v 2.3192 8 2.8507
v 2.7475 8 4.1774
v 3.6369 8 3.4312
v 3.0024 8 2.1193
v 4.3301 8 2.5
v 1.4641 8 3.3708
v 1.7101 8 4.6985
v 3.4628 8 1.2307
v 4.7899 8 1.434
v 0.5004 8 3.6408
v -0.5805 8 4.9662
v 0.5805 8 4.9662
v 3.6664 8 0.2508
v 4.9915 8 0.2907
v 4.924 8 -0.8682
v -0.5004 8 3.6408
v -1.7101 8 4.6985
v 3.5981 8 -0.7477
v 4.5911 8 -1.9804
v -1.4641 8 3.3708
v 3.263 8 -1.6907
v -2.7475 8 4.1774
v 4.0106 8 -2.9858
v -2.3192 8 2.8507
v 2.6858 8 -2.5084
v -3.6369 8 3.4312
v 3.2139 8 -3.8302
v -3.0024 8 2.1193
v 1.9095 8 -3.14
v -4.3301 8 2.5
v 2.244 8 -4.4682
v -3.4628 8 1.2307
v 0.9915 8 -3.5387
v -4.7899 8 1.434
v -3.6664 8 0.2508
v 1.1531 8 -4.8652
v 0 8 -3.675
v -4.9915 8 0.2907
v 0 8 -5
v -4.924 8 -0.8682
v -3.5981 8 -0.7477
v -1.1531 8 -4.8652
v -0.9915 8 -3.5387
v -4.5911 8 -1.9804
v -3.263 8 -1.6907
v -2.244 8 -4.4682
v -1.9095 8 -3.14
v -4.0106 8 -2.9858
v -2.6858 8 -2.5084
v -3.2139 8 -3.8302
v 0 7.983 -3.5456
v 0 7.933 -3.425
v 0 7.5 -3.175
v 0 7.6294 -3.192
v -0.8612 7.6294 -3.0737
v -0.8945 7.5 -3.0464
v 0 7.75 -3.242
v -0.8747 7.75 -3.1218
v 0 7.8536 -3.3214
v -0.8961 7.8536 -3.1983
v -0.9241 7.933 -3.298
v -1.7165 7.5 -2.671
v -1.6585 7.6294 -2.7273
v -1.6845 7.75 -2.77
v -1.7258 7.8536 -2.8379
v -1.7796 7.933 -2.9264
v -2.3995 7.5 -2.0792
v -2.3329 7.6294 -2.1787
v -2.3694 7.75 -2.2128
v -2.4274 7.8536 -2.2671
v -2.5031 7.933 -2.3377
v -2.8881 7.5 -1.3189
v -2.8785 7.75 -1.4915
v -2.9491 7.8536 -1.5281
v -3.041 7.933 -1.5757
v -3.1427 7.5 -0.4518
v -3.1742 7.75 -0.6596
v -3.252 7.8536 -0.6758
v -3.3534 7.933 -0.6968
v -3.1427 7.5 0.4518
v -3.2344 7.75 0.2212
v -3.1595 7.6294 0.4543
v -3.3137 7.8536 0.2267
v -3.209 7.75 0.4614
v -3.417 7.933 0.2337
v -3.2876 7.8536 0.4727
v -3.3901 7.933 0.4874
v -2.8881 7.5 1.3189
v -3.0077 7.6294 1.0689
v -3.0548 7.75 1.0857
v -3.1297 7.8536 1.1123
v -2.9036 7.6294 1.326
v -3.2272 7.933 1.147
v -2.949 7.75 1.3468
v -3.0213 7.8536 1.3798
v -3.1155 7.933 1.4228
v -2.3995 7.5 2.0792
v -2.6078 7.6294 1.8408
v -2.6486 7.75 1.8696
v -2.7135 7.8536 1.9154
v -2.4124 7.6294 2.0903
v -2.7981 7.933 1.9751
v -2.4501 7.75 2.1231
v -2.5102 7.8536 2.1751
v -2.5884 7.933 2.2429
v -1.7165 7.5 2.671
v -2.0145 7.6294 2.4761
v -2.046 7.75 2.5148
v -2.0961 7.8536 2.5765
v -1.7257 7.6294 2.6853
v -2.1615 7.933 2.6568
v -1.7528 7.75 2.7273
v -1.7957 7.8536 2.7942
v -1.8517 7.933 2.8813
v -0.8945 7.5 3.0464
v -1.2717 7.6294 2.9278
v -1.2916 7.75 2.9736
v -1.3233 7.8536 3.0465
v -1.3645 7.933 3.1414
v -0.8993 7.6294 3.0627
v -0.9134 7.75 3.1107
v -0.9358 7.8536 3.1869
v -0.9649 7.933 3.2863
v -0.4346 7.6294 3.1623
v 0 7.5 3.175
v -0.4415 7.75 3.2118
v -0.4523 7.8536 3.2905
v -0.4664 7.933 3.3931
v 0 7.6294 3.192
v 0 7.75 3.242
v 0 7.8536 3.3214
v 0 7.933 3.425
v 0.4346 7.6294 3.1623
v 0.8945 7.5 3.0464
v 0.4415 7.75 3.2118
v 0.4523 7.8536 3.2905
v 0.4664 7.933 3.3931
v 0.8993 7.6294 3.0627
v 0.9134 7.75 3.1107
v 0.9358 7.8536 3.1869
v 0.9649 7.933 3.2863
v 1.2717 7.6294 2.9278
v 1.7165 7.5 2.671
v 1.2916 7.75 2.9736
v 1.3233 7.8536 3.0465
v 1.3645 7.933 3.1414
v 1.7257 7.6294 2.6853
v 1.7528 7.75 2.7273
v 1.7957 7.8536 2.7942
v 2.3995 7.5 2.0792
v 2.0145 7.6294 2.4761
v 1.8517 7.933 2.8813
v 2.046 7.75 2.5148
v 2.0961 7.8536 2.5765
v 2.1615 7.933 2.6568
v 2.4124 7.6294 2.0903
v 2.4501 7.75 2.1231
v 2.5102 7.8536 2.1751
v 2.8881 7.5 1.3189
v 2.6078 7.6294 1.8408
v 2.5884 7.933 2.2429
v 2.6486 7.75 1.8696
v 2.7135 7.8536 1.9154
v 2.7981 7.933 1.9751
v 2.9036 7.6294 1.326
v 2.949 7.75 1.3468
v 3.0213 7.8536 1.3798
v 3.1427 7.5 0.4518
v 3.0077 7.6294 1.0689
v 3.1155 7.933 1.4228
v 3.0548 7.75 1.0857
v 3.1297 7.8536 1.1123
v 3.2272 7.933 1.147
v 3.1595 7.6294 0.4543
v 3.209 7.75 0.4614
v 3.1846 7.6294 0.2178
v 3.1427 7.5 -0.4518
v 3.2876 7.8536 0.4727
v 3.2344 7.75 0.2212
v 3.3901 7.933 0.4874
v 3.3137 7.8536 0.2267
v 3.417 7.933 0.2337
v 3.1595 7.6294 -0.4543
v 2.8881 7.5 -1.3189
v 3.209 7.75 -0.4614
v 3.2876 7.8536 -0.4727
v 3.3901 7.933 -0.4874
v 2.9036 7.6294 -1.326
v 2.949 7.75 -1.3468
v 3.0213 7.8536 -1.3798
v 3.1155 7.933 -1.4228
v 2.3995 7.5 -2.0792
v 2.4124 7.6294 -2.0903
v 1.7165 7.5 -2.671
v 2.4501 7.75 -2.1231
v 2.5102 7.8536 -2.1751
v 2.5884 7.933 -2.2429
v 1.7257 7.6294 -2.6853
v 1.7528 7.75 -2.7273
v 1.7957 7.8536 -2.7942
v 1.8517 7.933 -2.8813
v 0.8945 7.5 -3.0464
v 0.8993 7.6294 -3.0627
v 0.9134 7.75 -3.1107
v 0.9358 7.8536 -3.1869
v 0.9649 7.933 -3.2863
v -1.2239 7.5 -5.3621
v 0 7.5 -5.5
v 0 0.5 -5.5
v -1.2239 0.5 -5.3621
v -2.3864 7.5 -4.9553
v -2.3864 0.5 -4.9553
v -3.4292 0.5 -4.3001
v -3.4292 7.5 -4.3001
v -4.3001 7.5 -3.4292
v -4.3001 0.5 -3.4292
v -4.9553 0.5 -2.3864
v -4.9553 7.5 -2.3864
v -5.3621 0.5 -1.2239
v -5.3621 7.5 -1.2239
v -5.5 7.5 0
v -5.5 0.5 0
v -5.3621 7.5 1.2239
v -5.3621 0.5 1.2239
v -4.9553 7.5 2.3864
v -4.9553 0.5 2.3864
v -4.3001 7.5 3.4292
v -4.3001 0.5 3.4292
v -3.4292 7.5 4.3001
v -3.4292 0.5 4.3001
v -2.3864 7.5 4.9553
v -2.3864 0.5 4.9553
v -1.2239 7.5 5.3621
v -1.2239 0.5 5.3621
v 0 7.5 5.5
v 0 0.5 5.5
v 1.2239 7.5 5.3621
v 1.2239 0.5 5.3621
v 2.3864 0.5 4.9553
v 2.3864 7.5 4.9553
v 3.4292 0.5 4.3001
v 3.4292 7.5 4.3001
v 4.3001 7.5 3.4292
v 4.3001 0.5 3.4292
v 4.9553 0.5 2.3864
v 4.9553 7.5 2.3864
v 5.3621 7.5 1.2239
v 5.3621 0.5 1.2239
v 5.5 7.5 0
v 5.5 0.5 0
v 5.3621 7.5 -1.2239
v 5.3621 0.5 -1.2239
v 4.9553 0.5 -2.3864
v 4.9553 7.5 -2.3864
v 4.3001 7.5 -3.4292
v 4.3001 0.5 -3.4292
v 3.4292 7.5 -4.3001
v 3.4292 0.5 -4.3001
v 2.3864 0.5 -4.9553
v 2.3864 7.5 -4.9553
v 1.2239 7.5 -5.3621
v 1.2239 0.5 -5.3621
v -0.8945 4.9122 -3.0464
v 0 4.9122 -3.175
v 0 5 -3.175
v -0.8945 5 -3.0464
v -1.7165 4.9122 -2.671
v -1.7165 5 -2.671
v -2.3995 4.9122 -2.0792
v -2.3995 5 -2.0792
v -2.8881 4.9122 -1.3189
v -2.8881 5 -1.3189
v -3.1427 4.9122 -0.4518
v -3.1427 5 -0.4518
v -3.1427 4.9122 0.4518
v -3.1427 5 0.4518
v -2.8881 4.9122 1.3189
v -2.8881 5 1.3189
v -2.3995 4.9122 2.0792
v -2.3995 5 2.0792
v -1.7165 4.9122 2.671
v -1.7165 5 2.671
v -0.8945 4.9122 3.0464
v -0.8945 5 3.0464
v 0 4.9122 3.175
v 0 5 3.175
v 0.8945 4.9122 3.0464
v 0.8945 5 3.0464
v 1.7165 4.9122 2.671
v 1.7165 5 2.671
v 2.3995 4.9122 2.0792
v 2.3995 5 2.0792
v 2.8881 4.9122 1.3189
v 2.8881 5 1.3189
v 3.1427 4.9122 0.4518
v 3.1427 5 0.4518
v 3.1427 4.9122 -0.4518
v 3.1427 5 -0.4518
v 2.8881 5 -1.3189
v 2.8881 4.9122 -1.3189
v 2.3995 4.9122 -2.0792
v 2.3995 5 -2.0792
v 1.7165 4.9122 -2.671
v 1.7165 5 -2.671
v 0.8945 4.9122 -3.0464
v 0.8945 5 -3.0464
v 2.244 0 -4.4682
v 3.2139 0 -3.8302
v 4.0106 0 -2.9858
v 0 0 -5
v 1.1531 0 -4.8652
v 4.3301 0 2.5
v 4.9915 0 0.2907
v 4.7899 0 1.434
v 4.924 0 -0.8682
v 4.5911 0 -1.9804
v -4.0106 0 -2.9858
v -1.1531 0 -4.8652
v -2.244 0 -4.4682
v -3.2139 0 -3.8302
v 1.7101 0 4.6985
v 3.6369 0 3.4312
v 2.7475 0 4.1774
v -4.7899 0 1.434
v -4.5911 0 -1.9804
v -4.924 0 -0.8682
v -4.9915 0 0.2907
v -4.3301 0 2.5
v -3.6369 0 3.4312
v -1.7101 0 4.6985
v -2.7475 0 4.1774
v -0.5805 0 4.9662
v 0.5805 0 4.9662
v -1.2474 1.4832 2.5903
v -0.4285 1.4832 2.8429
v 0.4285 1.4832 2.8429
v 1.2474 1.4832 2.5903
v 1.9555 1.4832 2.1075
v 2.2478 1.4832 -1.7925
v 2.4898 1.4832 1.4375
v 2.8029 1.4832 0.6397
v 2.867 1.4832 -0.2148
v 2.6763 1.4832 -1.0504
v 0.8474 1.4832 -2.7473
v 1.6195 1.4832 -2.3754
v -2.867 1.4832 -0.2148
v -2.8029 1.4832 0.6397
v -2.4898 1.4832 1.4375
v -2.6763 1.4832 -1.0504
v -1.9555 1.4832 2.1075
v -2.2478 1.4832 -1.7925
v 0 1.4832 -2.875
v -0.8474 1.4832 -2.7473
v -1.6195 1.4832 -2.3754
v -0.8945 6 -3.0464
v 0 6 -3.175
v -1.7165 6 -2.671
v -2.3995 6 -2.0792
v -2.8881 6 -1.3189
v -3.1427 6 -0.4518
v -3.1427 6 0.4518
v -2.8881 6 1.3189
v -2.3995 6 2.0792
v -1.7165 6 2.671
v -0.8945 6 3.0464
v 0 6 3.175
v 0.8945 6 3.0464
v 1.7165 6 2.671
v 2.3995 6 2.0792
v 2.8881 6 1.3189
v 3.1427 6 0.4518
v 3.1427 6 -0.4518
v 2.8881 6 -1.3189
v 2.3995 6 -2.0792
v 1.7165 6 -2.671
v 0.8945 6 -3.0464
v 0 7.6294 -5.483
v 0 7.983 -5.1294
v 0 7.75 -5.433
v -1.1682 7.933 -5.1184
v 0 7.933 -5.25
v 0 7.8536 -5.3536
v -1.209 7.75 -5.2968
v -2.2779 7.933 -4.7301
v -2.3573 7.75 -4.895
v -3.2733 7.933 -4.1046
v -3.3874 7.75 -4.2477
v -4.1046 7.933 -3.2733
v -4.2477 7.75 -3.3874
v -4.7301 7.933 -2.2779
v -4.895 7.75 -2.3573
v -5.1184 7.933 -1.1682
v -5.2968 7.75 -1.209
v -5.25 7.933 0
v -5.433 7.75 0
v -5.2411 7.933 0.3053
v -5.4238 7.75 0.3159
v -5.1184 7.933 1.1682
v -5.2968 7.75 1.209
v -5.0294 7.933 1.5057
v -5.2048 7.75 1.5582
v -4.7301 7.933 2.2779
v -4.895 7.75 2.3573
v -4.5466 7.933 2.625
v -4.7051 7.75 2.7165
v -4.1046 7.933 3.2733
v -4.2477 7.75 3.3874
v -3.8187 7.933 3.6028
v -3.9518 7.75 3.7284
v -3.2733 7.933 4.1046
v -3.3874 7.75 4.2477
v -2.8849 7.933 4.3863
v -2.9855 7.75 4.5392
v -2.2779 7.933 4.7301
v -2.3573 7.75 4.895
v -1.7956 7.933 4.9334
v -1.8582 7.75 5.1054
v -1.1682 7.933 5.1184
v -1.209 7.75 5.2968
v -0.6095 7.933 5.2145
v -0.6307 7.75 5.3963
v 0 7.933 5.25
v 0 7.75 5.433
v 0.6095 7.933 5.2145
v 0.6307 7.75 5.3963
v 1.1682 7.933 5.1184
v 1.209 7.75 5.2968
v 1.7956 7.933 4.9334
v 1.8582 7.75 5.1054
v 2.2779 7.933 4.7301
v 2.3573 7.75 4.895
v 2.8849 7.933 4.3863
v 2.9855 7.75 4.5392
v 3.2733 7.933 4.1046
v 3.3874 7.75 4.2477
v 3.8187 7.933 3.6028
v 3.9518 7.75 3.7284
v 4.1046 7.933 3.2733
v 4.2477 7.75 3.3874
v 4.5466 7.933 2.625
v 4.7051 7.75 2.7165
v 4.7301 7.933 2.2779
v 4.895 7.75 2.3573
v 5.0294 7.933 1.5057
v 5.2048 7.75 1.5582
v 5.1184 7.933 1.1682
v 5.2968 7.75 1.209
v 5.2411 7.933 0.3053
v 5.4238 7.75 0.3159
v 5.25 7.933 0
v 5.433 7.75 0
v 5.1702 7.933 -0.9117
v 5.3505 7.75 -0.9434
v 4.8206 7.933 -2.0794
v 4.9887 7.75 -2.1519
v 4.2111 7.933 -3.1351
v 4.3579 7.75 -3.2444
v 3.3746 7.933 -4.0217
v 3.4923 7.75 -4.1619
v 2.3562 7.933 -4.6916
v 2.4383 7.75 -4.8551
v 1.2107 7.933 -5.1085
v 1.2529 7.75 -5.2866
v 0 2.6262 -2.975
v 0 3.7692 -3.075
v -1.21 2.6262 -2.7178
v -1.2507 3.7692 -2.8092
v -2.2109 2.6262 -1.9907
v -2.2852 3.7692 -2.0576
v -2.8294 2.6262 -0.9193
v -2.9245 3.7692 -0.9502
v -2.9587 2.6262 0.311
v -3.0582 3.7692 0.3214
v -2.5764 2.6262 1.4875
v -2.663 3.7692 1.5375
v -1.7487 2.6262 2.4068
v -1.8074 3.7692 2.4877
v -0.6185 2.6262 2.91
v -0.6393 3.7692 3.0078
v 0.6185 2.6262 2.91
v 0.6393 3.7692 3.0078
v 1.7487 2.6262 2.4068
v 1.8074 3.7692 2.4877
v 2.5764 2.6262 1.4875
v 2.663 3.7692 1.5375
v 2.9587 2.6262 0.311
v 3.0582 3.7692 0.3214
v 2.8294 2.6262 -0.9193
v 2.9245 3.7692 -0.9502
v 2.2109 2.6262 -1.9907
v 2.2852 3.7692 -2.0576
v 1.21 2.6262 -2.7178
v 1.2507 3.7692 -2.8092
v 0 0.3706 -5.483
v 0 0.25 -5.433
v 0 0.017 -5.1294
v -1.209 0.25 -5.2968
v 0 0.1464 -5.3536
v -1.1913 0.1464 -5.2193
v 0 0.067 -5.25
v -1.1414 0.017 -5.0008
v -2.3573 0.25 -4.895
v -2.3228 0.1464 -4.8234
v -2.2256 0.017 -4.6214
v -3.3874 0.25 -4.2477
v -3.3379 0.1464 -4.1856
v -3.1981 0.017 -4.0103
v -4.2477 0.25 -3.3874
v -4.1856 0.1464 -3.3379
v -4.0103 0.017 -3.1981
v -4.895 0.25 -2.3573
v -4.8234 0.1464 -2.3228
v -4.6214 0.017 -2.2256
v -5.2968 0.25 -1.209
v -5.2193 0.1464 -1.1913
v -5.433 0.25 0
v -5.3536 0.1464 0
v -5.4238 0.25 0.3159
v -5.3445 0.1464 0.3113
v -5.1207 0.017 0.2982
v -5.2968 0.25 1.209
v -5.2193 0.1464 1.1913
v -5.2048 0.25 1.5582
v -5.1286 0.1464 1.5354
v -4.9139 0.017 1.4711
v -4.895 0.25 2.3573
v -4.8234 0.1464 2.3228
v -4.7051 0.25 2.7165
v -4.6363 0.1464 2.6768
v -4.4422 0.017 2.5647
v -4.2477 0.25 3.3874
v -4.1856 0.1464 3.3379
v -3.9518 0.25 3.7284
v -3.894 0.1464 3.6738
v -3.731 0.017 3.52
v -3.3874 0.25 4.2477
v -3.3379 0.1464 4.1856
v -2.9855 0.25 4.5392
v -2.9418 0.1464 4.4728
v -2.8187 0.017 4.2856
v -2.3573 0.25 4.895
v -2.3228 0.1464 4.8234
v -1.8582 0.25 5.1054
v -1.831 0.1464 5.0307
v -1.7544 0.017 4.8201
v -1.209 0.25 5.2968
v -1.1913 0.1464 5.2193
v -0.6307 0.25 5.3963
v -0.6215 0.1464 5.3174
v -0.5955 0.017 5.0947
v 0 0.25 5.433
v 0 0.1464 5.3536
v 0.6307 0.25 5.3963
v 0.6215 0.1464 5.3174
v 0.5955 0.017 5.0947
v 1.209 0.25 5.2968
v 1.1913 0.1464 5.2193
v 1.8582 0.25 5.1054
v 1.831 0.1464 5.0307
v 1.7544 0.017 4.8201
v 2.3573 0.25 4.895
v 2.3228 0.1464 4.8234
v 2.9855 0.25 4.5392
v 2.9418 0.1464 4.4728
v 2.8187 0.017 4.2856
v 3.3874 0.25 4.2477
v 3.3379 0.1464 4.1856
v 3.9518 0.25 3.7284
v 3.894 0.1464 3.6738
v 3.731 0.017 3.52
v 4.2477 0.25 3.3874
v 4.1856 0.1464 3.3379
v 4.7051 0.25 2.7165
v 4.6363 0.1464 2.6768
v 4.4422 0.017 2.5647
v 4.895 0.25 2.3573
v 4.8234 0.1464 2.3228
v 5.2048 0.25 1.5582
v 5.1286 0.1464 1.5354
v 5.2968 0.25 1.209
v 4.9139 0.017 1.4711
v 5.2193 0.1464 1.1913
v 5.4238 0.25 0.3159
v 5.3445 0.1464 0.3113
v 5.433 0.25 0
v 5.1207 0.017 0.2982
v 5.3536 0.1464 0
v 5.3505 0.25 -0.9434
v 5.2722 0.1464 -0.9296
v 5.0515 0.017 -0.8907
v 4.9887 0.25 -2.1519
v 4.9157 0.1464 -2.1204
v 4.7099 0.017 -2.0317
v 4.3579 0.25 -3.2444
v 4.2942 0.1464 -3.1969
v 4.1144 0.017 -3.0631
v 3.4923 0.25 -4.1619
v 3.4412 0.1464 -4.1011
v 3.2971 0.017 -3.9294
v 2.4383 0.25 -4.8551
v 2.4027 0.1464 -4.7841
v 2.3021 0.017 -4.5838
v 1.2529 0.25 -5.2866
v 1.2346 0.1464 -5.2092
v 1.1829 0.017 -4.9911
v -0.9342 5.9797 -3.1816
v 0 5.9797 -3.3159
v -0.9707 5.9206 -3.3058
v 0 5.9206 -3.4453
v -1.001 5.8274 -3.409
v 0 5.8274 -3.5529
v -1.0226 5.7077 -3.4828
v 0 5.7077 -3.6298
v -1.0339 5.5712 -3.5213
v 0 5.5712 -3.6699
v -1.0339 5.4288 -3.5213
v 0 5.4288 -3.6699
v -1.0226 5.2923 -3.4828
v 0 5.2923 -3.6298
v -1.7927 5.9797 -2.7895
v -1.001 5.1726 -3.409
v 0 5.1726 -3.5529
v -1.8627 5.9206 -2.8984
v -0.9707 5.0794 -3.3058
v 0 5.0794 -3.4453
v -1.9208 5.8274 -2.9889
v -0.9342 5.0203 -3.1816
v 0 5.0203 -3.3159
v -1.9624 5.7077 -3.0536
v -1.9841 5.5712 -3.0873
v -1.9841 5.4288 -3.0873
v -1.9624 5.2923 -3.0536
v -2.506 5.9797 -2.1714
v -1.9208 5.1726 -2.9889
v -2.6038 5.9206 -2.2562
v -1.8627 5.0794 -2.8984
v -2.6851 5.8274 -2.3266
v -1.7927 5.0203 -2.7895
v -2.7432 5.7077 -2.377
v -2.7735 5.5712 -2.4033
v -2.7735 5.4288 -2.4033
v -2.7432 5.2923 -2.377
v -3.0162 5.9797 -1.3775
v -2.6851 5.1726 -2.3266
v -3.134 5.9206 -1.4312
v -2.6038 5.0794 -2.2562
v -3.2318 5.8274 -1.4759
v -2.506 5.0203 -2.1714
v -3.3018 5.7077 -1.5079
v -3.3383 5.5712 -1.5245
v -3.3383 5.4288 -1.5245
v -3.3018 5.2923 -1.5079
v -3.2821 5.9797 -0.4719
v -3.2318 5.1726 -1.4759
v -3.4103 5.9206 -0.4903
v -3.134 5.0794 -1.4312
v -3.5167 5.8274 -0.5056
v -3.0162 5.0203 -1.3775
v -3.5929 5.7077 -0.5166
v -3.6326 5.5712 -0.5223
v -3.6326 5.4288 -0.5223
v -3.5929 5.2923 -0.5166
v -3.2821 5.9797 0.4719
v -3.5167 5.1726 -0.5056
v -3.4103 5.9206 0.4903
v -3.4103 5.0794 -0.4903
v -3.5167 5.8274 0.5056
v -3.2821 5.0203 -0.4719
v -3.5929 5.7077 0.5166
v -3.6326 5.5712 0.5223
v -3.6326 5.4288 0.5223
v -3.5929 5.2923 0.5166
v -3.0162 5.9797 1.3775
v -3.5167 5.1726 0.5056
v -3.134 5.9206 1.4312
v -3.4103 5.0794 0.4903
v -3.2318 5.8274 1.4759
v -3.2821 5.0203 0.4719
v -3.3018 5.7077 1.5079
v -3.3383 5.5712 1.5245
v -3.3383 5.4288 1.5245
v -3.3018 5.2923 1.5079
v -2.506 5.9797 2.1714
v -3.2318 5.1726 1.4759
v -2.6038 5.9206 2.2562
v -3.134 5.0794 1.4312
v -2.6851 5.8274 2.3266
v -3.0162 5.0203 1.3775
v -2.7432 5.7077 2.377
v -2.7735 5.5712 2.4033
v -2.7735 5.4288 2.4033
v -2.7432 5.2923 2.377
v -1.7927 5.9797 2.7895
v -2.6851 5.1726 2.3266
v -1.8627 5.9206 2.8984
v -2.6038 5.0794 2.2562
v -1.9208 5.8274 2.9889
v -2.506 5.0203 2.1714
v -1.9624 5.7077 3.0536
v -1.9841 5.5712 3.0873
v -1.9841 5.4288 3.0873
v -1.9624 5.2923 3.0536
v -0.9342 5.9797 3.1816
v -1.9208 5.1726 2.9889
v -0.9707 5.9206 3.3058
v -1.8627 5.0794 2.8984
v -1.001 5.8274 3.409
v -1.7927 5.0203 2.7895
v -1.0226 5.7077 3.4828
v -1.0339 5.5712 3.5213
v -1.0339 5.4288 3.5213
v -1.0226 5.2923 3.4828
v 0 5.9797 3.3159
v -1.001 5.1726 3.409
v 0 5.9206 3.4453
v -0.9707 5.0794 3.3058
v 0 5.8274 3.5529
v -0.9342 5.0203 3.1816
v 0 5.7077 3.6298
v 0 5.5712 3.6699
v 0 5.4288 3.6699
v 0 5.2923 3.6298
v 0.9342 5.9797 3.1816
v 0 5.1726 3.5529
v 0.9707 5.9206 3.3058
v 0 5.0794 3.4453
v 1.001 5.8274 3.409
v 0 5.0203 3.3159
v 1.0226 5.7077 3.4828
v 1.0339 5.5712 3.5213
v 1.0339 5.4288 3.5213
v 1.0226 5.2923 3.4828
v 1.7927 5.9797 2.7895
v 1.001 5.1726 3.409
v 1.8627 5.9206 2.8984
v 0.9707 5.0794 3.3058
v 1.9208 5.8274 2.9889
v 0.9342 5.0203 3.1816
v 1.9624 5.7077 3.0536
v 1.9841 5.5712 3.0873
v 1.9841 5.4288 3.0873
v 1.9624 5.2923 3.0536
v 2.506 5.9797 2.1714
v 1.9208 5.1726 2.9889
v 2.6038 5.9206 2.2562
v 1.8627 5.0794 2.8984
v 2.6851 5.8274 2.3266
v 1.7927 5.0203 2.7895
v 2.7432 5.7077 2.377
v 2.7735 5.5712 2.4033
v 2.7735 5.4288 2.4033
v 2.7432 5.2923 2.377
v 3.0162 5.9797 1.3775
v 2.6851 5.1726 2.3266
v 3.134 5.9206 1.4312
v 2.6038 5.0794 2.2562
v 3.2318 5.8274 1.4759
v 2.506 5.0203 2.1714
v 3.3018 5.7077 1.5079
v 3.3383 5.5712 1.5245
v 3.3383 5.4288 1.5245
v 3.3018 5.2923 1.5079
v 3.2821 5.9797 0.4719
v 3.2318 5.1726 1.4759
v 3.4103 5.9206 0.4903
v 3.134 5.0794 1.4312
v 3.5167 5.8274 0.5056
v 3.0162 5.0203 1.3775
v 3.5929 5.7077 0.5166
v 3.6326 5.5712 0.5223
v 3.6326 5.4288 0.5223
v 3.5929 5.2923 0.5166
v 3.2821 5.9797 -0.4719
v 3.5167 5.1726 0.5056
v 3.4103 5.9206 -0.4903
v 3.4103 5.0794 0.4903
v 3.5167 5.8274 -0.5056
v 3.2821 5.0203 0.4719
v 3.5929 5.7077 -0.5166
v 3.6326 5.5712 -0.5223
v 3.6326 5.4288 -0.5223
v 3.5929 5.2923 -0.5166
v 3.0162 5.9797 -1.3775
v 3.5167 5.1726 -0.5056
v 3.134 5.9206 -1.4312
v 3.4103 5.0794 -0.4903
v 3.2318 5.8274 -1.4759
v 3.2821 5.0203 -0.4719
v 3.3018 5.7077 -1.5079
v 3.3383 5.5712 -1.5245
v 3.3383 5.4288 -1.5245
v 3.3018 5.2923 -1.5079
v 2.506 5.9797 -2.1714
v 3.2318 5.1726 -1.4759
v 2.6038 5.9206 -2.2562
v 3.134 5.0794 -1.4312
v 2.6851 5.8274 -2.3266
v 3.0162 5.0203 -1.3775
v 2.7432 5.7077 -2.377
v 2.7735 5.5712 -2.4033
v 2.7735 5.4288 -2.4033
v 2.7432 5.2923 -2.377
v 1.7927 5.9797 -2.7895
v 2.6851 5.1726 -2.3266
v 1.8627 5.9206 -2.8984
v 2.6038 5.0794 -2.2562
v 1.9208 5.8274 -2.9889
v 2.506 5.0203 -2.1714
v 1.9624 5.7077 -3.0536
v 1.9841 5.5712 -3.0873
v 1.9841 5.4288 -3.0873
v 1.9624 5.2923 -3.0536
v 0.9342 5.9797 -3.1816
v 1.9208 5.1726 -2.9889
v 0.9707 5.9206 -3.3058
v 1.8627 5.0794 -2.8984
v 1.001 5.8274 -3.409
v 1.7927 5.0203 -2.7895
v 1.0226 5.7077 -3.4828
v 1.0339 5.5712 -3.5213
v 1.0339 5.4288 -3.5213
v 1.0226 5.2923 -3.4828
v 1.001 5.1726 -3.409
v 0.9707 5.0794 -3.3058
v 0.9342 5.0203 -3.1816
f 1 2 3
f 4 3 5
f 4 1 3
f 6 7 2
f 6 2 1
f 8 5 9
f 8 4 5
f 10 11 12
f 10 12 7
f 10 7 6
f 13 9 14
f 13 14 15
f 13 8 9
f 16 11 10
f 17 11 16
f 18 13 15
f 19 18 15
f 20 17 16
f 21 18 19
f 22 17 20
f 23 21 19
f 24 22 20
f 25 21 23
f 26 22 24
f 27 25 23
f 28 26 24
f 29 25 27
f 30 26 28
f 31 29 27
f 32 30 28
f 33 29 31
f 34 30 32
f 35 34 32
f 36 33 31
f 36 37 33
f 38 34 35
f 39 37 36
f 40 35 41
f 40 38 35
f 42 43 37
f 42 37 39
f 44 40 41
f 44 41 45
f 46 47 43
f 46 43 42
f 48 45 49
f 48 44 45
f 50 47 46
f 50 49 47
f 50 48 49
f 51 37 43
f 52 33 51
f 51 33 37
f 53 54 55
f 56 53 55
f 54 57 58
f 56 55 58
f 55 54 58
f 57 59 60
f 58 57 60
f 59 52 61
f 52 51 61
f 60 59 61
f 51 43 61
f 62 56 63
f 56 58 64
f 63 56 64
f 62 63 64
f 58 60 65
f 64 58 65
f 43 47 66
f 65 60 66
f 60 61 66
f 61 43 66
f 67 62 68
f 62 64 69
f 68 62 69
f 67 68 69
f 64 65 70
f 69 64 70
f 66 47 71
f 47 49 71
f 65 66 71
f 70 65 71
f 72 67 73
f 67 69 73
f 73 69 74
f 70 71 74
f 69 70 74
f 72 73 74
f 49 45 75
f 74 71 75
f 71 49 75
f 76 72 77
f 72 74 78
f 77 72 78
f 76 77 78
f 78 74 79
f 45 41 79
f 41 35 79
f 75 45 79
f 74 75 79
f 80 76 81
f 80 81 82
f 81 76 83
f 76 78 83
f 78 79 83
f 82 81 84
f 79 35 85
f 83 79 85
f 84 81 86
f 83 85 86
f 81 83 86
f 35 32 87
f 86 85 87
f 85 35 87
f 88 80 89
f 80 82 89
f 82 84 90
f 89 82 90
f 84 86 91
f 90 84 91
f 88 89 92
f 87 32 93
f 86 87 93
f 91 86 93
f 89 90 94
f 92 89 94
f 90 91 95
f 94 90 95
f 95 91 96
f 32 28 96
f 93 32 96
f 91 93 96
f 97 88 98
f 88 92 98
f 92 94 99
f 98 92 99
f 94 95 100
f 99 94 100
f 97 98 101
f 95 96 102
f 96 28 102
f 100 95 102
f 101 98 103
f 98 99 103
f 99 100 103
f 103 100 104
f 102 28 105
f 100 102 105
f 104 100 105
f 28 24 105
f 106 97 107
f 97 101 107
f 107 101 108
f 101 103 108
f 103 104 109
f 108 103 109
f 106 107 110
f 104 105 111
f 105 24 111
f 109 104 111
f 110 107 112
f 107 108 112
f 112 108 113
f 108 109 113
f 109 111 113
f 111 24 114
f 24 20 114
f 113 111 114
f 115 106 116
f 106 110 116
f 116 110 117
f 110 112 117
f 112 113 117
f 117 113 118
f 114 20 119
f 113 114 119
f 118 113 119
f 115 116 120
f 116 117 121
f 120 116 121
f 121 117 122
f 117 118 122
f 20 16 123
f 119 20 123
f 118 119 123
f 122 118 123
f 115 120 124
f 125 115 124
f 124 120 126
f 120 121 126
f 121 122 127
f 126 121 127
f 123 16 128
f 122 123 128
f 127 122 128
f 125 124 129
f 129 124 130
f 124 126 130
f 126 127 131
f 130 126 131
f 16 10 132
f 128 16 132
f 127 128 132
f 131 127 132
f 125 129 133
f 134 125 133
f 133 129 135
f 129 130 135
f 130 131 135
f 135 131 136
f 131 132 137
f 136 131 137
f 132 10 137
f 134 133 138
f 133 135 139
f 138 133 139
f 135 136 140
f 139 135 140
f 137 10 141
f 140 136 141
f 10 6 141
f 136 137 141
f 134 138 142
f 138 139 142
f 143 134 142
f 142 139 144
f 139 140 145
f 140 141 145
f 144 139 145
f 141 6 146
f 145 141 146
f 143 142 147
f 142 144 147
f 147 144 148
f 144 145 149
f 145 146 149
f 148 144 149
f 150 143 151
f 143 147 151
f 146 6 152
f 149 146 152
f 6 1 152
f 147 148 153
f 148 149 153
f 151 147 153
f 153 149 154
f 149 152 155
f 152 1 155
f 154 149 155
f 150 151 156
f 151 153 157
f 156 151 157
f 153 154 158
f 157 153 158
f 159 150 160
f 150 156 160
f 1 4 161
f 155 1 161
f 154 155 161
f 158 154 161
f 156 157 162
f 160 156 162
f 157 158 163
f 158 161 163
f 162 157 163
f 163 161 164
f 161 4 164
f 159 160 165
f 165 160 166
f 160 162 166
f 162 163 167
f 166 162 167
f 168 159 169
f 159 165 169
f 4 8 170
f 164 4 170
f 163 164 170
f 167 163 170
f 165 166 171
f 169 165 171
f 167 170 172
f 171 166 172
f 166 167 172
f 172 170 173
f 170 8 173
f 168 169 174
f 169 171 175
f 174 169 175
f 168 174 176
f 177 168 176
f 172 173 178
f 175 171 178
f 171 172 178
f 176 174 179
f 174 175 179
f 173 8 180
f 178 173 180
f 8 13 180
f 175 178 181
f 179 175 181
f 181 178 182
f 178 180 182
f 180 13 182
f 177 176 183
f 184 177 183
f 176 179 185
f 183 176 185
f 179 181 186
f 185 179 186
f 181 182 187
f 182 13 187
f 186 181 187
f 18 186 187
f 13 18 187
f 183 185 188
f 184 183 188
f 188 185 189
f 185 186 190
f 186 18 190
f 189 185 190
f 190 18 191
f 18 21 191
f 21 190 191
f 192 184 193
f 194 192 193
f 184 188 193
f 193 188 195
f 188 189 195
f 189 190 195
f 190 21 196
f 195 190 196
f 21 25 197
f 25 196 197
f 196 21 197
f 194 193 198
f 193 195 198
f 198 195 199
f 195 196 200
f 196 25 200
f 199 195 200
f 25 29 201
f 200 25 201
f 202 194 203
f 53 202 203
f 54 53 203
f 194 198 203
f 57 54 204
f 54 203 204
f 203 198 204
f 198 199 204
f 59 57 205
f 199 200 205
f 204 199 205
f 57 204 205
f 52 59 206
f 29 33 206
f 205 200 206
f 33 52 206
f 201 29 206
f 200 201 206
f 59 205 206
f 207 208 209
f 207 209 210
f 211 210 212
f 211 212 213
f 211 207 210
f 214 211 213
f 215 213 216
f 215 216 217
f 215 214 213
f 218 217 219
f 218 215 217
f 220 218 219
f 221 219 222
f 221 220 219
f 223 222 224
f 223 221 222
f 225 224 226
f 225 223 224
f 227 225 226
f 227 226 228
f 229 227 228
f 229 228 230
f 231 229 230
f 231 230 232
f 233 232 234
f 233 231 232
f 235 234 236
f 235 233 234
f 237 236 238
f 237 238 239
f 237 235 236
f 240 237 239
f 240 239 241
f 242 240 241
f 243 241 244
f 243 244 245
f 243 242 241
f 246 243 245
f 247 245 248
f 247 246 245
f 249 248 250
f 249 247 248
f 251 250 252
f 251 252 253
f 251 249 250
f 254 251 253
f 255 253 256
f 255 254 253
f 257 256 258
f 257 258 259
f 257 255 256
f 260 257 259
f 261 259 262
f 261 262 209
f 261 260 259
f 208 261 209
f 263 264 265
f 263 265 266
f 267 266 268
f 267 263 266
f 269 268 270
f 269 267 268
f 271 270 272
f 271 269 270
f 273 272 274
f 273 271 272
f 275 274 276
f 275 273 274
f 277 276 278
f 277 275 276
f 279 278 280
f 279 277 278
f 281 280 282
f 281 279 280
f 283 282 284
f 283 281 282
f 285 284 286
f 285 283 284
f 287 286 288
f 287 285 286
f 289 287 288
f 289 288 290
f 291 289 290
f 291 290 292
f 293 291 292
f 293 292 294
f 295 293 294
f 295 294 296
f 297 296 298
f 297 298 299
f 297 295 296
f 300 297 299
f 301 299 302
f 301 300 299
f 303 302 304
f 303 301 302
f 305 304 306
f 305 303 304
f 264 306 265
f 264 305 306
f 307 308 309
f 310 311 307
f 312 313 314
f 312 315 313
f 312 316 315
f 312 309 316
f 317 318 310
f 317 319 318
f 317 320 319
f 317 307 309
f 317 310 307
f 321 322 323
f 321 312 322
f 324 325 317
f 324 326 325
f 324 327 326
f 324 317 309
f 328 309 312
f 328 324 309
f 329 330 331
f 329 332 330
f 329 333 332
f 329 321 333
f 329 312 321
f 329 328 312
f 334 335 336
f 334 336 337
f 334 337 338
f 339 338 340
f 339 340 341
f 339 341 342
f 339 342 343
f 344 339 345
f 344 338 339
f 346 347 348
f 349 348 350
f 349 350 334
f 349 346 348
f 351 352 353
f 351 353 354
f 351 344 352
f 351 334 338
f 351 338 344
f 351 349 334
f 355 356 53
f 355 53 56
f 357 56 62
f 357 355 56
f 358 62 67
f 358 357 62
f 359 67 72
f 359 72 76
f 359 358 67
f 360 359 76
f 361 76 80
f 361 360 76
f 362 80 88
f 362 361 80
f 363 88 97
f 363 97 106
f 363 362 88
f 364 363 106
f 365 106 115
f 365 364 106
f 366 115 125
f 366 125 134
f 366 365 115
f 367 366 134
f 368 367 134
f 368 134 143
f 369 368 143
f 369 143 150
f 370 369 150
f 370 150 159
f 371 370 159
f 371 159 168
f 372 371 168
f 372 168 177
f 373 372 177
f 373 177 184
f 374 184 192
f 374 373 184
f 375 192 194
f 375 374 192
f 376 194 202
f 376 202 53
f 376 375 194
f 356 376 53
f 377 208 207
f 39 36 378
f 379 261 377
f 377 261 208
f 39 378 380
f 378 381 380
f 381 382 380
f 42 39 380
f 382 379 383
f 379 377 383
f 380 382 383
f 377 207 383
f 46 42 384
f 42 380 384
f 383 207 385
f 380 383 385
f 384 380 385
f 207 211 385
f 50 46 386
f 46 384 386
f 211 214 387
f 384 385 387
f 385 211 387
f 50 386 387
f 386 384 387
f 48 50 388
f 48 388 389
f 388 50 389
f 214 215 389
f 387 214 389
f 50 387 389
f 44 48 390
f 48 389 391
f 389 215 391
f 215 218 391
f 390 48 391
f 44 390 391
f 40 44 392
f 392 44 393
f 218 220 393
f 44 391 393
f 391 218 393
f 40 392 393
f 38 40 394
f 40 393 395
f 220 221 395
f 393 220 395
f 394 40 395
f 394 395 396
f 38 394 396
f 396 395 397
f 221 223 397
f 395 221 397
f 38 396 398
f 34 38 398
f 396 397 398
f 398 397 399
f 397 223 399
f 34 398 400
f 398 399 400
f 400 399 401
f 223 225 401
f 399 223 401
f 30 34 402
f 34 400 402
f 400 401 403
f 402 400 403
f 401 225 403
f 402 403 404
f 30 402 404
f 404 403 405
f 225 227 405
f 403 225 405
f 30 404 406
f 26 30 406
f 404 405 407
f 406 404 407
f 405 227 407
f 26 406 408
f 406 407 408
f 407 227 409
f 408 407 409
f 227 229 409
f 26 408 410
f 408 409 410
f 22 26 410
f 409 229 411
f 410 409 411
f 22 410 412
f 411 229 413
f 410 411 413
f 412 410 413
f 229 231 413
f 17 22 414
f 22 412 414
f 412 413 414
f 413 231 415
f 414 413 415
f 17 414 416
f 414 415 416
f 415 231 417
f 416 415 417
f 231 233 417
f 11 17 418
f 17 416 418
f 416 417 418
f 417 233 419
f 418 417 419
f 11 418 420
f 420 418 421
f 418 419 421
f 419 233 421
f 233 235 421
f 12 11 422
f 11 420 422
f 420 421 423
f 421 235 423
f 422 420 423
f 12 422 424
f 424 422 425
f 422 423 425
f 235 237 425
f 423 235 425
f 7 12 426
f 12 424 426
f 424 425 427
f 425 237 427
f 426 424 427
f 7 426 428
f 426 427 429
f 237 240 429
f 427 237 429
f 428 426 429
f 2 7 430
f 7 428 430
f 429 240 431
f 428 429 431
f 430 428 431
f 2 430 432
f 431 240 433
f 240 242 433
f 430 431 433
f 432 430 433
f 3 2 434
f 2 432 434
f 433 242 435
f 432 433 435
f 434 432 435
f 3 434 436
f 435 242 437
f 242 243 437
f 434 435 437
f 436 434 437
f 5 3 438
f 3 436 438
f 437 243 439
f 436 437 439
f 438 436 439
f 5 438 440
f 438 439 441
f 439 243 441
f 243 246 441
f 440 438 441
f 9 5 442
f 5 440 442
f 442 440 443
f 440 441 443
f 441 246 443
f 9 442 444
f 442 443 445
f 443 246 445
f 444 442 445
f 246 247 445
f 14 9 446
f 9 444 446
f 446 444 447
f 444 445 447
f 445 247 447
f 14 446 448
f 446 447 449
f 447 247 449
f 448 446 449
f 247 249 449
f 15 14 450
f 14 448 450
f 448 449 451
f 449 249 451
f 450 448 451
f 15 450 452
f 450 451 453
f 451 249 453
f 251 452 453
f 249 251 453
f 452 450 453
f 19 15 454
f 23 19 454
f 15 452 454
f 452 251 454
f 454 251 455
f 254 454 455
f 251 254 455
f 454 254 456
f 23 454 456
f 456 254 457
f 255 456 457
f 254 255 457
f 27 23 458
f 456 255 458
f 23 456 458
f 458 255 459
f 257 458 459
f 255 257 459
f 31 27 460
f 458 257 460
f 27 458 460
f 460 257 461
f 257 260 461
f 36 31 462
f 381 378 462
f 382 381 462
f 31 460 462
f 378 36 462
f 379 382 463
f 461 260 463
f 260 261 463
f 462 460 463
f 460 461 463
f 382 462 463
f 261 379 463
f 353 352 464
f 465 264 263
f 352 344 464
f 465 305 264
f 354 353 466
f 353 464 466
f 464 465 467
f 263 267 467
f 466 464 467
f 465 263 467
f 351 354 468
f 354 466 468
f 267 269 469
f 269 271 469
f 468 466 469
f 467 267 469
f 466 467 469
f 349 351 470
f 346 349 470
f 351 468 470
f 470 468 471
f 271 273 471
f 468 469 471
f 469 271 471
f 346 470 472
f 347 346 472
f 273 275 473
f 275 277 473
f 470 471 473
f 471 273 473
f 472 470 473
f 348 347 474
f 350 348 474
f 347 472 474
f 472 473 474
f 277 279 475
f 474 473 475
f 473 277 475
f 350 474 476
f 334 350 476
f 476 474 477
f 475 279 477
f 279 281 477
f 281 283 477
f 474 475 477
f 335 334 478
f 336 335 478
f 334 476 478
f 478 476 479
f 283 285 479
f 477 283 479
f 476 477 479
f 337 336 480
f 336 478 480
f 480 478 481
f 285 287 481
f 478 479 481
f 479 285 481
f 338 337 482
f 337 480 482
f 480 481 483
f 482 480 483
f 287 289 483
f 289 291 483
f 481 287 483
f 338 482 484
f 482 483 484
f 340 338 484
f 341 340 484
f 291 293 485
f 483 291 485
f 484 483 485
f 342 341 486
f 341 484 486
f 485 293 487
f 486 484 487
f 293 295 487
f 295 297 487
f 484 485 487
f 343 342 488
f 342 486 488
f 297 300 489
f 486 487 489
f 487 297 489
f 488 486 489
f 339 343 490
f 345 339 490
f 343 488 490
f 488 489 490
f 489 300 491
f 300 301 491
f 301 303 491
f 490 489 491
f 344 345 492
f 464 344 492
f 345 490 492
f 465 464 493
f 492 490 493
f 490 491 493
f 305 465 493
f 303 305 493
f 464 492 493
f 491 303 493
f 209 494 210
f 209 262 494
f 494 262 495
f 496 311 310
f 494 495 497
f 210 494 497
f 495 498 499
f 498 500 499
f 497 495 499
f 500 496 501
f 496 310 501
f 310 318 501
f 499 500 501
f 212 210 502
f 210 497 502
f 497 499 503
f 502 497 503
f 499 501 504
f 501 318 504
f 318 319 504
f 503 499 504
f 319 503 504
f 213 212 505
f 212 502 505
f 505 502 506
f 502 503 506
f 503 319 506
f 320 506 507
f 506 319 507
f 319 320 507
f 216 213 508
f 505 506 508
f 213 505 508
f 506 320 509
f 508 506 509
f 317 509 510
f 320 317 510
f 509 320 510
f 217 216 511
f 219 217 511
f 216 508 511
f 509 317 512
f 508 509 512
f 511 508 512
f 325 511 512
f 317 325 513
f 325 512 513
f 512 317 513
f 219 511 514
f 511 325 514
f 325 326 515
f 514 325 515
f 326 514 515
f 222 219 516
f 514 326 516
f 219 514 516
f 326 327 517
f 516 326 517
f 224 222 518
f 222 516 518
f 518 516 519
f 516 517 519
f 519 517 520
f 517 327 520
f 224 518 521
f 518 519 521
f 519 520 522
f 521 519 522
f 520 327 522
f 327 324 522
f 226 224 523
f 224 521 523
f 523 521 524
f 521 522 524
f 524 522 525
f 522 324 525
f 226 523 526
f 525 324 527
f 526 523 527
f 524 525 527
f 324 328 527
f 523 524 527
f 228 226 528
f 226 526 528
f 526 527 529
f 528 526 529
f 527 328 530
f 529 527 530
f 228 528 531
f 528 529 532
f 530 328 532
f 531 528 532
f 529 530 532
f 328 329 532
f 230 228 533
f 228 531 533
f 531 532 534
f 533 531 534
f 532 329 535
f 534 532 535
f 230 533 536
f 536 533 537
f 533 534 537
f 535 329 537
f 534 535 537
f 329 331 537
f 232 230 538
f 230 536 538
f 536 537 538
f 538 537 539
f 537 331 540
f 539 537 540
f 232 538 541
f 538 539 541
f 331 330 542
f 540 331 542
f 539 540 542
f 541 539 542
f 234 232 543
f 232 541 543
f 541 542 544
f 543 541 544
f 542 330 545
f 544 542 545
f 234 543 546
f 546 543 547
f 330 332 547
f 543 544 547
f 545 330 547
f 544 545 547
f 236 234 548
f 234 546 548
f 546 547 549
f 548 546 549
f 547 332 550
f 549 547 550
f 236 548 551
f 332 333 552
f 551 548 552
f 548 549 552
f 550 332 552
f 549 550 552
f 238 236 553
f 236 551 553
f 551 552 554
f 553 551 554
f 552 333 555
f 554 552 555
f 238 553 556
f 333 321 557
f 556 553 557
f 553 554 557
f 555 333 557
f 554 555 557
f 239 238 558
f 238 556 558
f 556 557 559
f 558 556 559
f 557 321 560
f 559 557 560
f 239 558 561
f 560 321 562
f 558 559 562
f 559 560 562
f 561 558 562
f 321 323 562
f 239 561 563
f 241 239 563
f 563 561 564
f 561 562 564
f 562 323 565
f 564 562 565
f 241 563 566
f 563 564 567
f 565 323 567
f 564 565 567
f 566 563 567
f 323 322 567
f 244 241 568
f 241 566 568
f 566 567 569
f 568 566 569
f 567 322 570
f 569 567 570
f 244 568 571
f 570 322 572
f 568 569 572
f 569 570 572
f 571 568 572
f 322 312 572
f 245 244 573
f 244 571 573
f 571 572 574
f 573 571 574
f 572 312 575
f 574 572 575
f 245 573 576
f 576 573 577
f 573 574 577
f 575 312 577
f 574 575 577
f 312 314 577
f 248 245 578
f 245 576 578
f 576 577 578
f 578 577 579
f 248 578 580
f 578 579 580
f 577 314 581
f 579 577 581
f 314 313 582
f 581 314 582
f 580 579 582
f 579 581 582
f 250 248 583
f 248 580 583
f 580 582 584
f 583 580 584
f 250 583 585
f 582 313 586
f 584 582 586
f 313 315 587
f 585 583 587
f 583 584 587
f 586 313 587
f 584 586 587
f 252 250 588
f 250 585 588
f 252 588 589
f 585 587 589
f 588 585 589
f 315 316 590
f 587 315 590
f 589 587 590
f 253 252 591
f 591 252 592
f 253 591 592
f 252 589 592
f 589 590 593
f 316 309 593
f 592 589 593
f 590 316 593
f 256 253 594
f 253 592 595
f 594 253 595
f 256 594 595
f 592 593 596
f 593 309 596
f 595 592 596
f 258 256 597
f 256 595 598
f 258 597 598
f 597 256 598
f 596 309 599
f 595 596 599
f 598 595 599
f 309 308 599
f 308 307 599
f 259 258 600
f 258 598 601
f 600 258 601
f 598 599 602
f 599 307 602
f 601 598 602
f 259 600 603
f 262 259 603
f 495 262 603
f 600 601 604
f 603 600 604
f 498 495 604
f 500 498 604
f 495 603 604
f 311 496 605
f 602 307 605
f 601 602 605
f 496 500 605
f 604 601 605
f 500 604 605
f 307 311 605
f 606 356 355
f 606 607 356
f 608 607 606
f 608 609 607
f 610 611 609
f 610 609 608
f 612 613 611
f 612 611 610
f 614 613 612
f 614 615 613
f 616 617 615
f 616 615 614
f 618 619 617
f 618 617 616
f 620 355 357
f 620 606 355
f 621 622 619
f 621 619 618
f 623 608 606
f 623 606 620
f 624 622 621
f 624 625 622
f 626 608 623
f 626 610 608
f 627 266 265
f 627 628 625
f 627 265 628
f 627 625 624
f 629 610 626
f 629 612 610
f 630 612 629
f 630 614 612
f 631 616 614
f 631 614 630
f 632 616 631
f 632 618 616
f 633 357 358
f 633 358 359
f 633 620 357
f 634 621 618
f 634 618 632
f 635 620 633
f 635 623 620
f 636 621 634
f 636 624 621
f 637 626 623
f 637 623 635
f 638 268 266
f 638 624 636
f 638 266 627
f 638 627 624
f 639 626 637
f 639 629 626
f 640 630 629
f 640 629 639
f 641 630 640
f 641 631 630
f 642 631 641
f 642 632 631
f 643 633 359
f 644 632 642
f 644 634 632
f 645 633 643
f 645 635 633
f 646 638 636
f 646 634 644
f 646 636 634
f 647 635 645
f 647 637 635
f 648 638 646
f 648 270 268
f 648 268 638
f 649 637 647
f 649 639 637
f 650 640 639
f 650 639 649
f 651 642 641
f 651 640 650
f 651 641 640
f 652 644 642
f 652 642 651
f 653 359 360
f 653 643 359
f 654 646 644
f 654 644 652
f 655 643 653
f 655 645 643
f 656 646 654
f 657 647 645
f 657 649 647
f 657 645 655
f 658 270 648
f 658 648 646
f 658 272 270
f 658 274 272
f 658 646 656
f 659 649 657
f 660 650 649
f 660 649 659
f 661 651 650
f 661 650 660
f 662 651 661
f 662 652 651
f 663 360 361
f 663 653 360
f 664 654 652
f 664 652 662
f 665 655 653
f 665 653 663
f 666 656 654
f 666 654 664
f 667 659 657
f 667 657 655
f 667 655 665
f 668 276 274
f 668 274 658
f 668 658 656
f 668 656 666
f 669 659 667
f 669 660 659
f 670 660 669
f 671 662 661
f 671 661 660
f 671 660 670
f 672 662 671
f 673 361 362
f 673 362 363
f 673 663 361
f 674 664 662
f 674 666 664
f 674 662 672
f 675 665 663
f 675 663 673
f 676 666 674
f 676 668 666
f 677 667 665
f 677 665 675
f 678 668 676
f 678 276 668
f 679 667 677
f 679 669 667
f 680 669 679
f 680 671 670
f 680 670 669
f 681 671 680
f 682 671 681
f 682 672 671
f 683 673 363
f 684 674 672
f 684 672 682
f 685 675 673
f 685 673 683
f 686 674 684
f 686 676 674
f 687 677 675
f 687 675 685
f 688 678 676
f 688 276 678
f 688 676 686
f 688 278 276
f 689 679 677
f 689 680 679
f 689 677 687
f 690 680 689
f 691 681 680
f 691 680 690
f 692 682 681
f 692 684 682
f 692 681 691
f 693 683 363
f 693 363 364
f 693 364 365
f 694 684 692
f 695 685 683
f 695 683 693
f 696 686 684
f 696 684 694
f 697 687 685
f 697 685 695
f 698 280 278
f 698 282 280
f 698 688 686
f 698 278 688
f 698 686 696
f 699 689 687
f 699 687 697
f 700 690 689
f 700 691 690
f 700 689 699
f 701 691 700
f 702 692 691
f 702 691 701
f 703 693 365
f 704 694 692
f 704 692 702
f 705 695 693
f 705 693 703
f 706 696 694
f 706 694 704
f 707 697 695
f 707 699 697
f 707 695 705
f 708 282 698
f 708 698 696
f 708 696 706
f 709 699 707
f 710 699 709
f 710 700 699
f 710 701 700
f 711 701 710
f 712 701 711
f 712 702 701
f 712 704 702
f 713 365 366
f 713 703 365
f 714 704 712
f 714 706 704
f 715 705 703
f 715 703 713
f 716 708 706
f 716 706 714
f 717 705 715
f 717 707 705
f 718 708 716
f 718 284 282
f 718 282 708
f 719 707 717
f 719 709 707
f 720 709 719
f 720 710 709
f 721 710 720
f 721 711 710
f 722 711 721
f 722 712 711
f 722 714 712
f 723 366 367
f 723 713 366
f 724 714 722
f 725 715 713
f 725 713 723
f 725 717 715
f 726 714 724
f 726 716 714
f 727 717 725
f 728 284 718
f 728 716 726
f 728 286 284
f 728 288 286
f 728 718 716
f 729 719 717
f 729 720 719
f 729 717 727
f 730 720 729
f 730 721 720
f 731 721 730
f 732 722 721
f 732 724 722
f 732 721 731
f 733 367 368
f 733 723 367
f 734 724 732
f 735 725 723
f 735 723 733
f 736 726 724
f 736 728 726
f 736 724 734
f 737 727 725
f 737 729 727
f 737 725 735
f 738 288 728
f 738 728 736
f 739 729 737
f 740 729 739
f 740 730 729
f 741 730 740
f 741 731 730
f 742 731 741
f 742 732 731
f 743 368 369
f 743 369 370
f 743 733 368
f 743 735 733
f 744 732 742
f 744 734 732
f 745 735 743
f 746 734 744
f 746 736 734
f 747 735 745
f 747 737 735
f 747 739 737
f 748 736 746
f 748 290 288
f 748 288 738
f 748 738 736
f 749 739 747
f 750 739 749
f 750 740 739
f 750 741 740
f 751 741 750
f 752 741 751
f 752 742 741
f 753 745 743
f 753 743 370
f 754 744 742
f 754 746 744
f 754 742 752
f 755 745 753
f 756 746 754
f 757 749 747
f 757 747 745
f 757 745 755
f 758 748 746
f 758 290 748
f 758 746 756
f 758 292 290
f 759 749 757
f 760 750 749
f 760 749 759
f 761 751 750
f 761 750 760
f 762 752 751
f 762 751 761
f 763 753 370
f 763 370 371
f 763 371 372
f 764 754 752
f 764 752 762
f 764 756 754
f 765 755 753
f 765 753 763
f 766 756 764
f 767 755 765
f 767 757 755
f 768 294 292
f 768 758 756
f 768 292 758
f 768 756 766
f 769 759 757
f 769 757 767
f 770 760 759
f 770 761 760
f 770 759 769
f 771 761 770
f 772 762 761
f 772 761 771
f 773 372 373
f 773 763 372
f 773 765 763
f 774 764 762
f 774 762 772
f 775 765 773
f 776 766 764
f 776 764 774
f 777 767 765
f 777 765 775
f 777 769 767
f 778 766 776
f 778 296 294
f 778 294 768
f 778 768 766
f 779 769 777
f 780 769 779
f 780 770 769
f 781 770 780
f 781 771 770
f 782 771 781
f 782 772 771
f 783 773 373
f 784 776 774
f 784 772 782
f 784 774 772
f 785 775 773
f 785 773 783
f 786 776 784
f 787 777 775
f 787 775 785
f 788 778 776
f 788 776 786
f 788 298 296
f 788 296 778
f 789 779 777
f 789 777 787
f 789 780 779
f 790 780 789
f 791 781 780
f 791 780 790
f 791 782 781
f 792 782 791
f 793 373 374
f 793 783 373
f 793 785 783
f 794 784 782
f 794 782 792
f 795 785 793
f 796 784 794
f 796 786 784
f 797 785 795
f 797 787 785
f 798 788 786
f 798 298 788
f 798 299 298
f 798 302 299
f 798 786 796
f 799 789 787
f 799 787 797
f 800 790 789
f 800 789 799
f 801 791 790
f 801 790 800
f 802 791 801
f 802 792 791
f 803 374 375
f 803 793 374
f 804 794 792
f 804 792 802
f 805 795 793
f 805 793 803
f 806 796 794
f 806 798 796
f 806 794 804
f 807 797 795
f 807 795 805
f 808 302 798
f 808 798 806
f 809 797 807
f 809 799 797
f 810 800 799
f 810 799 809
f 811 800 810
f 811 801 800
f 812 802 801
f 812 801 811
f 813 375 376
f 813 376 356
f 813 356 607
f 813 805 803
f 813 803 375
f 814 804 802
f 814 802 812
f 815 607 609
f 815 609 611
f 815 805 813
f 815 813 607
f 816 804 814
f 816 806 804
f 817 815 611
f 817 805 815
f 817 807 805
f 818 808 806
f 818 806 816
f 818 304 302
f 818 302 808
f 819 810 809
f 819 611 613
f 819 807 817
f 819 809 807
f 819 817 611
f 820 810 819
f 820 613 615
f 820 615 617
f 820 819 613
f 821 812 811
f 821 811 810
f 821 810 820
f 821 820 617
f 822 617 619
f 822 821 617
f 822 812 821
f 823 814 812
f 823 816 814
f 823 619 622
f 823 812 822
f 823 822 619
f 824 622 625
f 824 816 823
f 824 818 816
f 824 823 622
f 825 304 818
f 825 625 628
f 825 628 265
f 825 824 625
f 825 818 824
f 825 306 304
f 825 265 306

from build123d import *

# Parameters (mm, degrees)
CHAMFER1_SIZE  = 0.3
CHAMFER1_SIZE2 = 3.429015691
FILLET1_R      = 0.5


with BuildPart() as part:
    # Sketch3 → Revolve1 (revolve)
    with BuildSketch(Plane.XY, mode=Mode.PRIVATE) as revolve1_sk:
        with BuildLine():
            Line((0, 0), (-5.5, 0))
            Line((-5.5, 0), (-5.5, 8))
            Line((-5.5, 8), (-3.175, 8))
            Line((-3.175, 8), (-3.175, 6))
            ThreePointArc((-3.175, 6), (-3.675, 5.5), (-3.175, 5))
            Line((-3.175, 5), (-3.175, 1.483219346))
            Line((-3.175, 1.483219346), (0, 1.483219346))
            Line((0, 1.483219346), (0, 0))
        make_face()
    revolve(revolve1_sk.sketch.rotate(Axis((0, 0, 0), (0, 1, 0)), 270), axis=Axis((0, 0, 0), (0, 1, 0)))

    # Chamfer1
    chamfer1_edges = [part.edges().sort_by_distance(p)[0] for p in [
        (0, 1.483219346, 3.175),
    ]]
    chamfer1_side = [part.faces().sort_by_distance(p)[0] for p in [
        (0, 1.483219346, 0),
    ]]
    chamfer(chamfer1_edges, length=CHAMFER1_SIZE, length2=CHAMFER1_SIZE2, reference=chamfer1_side[0])

    # Fillet1
    fillet1_edges = [part.edges().sort_by_distance(p)[0] for p in [
        (0, 0, 5.5),
        (0, 8, 5.5),
        (0, 8, 3.175),
    ]]
    fillet(fillet1_edges, radius=FILLET1_R)


solid = part.part
